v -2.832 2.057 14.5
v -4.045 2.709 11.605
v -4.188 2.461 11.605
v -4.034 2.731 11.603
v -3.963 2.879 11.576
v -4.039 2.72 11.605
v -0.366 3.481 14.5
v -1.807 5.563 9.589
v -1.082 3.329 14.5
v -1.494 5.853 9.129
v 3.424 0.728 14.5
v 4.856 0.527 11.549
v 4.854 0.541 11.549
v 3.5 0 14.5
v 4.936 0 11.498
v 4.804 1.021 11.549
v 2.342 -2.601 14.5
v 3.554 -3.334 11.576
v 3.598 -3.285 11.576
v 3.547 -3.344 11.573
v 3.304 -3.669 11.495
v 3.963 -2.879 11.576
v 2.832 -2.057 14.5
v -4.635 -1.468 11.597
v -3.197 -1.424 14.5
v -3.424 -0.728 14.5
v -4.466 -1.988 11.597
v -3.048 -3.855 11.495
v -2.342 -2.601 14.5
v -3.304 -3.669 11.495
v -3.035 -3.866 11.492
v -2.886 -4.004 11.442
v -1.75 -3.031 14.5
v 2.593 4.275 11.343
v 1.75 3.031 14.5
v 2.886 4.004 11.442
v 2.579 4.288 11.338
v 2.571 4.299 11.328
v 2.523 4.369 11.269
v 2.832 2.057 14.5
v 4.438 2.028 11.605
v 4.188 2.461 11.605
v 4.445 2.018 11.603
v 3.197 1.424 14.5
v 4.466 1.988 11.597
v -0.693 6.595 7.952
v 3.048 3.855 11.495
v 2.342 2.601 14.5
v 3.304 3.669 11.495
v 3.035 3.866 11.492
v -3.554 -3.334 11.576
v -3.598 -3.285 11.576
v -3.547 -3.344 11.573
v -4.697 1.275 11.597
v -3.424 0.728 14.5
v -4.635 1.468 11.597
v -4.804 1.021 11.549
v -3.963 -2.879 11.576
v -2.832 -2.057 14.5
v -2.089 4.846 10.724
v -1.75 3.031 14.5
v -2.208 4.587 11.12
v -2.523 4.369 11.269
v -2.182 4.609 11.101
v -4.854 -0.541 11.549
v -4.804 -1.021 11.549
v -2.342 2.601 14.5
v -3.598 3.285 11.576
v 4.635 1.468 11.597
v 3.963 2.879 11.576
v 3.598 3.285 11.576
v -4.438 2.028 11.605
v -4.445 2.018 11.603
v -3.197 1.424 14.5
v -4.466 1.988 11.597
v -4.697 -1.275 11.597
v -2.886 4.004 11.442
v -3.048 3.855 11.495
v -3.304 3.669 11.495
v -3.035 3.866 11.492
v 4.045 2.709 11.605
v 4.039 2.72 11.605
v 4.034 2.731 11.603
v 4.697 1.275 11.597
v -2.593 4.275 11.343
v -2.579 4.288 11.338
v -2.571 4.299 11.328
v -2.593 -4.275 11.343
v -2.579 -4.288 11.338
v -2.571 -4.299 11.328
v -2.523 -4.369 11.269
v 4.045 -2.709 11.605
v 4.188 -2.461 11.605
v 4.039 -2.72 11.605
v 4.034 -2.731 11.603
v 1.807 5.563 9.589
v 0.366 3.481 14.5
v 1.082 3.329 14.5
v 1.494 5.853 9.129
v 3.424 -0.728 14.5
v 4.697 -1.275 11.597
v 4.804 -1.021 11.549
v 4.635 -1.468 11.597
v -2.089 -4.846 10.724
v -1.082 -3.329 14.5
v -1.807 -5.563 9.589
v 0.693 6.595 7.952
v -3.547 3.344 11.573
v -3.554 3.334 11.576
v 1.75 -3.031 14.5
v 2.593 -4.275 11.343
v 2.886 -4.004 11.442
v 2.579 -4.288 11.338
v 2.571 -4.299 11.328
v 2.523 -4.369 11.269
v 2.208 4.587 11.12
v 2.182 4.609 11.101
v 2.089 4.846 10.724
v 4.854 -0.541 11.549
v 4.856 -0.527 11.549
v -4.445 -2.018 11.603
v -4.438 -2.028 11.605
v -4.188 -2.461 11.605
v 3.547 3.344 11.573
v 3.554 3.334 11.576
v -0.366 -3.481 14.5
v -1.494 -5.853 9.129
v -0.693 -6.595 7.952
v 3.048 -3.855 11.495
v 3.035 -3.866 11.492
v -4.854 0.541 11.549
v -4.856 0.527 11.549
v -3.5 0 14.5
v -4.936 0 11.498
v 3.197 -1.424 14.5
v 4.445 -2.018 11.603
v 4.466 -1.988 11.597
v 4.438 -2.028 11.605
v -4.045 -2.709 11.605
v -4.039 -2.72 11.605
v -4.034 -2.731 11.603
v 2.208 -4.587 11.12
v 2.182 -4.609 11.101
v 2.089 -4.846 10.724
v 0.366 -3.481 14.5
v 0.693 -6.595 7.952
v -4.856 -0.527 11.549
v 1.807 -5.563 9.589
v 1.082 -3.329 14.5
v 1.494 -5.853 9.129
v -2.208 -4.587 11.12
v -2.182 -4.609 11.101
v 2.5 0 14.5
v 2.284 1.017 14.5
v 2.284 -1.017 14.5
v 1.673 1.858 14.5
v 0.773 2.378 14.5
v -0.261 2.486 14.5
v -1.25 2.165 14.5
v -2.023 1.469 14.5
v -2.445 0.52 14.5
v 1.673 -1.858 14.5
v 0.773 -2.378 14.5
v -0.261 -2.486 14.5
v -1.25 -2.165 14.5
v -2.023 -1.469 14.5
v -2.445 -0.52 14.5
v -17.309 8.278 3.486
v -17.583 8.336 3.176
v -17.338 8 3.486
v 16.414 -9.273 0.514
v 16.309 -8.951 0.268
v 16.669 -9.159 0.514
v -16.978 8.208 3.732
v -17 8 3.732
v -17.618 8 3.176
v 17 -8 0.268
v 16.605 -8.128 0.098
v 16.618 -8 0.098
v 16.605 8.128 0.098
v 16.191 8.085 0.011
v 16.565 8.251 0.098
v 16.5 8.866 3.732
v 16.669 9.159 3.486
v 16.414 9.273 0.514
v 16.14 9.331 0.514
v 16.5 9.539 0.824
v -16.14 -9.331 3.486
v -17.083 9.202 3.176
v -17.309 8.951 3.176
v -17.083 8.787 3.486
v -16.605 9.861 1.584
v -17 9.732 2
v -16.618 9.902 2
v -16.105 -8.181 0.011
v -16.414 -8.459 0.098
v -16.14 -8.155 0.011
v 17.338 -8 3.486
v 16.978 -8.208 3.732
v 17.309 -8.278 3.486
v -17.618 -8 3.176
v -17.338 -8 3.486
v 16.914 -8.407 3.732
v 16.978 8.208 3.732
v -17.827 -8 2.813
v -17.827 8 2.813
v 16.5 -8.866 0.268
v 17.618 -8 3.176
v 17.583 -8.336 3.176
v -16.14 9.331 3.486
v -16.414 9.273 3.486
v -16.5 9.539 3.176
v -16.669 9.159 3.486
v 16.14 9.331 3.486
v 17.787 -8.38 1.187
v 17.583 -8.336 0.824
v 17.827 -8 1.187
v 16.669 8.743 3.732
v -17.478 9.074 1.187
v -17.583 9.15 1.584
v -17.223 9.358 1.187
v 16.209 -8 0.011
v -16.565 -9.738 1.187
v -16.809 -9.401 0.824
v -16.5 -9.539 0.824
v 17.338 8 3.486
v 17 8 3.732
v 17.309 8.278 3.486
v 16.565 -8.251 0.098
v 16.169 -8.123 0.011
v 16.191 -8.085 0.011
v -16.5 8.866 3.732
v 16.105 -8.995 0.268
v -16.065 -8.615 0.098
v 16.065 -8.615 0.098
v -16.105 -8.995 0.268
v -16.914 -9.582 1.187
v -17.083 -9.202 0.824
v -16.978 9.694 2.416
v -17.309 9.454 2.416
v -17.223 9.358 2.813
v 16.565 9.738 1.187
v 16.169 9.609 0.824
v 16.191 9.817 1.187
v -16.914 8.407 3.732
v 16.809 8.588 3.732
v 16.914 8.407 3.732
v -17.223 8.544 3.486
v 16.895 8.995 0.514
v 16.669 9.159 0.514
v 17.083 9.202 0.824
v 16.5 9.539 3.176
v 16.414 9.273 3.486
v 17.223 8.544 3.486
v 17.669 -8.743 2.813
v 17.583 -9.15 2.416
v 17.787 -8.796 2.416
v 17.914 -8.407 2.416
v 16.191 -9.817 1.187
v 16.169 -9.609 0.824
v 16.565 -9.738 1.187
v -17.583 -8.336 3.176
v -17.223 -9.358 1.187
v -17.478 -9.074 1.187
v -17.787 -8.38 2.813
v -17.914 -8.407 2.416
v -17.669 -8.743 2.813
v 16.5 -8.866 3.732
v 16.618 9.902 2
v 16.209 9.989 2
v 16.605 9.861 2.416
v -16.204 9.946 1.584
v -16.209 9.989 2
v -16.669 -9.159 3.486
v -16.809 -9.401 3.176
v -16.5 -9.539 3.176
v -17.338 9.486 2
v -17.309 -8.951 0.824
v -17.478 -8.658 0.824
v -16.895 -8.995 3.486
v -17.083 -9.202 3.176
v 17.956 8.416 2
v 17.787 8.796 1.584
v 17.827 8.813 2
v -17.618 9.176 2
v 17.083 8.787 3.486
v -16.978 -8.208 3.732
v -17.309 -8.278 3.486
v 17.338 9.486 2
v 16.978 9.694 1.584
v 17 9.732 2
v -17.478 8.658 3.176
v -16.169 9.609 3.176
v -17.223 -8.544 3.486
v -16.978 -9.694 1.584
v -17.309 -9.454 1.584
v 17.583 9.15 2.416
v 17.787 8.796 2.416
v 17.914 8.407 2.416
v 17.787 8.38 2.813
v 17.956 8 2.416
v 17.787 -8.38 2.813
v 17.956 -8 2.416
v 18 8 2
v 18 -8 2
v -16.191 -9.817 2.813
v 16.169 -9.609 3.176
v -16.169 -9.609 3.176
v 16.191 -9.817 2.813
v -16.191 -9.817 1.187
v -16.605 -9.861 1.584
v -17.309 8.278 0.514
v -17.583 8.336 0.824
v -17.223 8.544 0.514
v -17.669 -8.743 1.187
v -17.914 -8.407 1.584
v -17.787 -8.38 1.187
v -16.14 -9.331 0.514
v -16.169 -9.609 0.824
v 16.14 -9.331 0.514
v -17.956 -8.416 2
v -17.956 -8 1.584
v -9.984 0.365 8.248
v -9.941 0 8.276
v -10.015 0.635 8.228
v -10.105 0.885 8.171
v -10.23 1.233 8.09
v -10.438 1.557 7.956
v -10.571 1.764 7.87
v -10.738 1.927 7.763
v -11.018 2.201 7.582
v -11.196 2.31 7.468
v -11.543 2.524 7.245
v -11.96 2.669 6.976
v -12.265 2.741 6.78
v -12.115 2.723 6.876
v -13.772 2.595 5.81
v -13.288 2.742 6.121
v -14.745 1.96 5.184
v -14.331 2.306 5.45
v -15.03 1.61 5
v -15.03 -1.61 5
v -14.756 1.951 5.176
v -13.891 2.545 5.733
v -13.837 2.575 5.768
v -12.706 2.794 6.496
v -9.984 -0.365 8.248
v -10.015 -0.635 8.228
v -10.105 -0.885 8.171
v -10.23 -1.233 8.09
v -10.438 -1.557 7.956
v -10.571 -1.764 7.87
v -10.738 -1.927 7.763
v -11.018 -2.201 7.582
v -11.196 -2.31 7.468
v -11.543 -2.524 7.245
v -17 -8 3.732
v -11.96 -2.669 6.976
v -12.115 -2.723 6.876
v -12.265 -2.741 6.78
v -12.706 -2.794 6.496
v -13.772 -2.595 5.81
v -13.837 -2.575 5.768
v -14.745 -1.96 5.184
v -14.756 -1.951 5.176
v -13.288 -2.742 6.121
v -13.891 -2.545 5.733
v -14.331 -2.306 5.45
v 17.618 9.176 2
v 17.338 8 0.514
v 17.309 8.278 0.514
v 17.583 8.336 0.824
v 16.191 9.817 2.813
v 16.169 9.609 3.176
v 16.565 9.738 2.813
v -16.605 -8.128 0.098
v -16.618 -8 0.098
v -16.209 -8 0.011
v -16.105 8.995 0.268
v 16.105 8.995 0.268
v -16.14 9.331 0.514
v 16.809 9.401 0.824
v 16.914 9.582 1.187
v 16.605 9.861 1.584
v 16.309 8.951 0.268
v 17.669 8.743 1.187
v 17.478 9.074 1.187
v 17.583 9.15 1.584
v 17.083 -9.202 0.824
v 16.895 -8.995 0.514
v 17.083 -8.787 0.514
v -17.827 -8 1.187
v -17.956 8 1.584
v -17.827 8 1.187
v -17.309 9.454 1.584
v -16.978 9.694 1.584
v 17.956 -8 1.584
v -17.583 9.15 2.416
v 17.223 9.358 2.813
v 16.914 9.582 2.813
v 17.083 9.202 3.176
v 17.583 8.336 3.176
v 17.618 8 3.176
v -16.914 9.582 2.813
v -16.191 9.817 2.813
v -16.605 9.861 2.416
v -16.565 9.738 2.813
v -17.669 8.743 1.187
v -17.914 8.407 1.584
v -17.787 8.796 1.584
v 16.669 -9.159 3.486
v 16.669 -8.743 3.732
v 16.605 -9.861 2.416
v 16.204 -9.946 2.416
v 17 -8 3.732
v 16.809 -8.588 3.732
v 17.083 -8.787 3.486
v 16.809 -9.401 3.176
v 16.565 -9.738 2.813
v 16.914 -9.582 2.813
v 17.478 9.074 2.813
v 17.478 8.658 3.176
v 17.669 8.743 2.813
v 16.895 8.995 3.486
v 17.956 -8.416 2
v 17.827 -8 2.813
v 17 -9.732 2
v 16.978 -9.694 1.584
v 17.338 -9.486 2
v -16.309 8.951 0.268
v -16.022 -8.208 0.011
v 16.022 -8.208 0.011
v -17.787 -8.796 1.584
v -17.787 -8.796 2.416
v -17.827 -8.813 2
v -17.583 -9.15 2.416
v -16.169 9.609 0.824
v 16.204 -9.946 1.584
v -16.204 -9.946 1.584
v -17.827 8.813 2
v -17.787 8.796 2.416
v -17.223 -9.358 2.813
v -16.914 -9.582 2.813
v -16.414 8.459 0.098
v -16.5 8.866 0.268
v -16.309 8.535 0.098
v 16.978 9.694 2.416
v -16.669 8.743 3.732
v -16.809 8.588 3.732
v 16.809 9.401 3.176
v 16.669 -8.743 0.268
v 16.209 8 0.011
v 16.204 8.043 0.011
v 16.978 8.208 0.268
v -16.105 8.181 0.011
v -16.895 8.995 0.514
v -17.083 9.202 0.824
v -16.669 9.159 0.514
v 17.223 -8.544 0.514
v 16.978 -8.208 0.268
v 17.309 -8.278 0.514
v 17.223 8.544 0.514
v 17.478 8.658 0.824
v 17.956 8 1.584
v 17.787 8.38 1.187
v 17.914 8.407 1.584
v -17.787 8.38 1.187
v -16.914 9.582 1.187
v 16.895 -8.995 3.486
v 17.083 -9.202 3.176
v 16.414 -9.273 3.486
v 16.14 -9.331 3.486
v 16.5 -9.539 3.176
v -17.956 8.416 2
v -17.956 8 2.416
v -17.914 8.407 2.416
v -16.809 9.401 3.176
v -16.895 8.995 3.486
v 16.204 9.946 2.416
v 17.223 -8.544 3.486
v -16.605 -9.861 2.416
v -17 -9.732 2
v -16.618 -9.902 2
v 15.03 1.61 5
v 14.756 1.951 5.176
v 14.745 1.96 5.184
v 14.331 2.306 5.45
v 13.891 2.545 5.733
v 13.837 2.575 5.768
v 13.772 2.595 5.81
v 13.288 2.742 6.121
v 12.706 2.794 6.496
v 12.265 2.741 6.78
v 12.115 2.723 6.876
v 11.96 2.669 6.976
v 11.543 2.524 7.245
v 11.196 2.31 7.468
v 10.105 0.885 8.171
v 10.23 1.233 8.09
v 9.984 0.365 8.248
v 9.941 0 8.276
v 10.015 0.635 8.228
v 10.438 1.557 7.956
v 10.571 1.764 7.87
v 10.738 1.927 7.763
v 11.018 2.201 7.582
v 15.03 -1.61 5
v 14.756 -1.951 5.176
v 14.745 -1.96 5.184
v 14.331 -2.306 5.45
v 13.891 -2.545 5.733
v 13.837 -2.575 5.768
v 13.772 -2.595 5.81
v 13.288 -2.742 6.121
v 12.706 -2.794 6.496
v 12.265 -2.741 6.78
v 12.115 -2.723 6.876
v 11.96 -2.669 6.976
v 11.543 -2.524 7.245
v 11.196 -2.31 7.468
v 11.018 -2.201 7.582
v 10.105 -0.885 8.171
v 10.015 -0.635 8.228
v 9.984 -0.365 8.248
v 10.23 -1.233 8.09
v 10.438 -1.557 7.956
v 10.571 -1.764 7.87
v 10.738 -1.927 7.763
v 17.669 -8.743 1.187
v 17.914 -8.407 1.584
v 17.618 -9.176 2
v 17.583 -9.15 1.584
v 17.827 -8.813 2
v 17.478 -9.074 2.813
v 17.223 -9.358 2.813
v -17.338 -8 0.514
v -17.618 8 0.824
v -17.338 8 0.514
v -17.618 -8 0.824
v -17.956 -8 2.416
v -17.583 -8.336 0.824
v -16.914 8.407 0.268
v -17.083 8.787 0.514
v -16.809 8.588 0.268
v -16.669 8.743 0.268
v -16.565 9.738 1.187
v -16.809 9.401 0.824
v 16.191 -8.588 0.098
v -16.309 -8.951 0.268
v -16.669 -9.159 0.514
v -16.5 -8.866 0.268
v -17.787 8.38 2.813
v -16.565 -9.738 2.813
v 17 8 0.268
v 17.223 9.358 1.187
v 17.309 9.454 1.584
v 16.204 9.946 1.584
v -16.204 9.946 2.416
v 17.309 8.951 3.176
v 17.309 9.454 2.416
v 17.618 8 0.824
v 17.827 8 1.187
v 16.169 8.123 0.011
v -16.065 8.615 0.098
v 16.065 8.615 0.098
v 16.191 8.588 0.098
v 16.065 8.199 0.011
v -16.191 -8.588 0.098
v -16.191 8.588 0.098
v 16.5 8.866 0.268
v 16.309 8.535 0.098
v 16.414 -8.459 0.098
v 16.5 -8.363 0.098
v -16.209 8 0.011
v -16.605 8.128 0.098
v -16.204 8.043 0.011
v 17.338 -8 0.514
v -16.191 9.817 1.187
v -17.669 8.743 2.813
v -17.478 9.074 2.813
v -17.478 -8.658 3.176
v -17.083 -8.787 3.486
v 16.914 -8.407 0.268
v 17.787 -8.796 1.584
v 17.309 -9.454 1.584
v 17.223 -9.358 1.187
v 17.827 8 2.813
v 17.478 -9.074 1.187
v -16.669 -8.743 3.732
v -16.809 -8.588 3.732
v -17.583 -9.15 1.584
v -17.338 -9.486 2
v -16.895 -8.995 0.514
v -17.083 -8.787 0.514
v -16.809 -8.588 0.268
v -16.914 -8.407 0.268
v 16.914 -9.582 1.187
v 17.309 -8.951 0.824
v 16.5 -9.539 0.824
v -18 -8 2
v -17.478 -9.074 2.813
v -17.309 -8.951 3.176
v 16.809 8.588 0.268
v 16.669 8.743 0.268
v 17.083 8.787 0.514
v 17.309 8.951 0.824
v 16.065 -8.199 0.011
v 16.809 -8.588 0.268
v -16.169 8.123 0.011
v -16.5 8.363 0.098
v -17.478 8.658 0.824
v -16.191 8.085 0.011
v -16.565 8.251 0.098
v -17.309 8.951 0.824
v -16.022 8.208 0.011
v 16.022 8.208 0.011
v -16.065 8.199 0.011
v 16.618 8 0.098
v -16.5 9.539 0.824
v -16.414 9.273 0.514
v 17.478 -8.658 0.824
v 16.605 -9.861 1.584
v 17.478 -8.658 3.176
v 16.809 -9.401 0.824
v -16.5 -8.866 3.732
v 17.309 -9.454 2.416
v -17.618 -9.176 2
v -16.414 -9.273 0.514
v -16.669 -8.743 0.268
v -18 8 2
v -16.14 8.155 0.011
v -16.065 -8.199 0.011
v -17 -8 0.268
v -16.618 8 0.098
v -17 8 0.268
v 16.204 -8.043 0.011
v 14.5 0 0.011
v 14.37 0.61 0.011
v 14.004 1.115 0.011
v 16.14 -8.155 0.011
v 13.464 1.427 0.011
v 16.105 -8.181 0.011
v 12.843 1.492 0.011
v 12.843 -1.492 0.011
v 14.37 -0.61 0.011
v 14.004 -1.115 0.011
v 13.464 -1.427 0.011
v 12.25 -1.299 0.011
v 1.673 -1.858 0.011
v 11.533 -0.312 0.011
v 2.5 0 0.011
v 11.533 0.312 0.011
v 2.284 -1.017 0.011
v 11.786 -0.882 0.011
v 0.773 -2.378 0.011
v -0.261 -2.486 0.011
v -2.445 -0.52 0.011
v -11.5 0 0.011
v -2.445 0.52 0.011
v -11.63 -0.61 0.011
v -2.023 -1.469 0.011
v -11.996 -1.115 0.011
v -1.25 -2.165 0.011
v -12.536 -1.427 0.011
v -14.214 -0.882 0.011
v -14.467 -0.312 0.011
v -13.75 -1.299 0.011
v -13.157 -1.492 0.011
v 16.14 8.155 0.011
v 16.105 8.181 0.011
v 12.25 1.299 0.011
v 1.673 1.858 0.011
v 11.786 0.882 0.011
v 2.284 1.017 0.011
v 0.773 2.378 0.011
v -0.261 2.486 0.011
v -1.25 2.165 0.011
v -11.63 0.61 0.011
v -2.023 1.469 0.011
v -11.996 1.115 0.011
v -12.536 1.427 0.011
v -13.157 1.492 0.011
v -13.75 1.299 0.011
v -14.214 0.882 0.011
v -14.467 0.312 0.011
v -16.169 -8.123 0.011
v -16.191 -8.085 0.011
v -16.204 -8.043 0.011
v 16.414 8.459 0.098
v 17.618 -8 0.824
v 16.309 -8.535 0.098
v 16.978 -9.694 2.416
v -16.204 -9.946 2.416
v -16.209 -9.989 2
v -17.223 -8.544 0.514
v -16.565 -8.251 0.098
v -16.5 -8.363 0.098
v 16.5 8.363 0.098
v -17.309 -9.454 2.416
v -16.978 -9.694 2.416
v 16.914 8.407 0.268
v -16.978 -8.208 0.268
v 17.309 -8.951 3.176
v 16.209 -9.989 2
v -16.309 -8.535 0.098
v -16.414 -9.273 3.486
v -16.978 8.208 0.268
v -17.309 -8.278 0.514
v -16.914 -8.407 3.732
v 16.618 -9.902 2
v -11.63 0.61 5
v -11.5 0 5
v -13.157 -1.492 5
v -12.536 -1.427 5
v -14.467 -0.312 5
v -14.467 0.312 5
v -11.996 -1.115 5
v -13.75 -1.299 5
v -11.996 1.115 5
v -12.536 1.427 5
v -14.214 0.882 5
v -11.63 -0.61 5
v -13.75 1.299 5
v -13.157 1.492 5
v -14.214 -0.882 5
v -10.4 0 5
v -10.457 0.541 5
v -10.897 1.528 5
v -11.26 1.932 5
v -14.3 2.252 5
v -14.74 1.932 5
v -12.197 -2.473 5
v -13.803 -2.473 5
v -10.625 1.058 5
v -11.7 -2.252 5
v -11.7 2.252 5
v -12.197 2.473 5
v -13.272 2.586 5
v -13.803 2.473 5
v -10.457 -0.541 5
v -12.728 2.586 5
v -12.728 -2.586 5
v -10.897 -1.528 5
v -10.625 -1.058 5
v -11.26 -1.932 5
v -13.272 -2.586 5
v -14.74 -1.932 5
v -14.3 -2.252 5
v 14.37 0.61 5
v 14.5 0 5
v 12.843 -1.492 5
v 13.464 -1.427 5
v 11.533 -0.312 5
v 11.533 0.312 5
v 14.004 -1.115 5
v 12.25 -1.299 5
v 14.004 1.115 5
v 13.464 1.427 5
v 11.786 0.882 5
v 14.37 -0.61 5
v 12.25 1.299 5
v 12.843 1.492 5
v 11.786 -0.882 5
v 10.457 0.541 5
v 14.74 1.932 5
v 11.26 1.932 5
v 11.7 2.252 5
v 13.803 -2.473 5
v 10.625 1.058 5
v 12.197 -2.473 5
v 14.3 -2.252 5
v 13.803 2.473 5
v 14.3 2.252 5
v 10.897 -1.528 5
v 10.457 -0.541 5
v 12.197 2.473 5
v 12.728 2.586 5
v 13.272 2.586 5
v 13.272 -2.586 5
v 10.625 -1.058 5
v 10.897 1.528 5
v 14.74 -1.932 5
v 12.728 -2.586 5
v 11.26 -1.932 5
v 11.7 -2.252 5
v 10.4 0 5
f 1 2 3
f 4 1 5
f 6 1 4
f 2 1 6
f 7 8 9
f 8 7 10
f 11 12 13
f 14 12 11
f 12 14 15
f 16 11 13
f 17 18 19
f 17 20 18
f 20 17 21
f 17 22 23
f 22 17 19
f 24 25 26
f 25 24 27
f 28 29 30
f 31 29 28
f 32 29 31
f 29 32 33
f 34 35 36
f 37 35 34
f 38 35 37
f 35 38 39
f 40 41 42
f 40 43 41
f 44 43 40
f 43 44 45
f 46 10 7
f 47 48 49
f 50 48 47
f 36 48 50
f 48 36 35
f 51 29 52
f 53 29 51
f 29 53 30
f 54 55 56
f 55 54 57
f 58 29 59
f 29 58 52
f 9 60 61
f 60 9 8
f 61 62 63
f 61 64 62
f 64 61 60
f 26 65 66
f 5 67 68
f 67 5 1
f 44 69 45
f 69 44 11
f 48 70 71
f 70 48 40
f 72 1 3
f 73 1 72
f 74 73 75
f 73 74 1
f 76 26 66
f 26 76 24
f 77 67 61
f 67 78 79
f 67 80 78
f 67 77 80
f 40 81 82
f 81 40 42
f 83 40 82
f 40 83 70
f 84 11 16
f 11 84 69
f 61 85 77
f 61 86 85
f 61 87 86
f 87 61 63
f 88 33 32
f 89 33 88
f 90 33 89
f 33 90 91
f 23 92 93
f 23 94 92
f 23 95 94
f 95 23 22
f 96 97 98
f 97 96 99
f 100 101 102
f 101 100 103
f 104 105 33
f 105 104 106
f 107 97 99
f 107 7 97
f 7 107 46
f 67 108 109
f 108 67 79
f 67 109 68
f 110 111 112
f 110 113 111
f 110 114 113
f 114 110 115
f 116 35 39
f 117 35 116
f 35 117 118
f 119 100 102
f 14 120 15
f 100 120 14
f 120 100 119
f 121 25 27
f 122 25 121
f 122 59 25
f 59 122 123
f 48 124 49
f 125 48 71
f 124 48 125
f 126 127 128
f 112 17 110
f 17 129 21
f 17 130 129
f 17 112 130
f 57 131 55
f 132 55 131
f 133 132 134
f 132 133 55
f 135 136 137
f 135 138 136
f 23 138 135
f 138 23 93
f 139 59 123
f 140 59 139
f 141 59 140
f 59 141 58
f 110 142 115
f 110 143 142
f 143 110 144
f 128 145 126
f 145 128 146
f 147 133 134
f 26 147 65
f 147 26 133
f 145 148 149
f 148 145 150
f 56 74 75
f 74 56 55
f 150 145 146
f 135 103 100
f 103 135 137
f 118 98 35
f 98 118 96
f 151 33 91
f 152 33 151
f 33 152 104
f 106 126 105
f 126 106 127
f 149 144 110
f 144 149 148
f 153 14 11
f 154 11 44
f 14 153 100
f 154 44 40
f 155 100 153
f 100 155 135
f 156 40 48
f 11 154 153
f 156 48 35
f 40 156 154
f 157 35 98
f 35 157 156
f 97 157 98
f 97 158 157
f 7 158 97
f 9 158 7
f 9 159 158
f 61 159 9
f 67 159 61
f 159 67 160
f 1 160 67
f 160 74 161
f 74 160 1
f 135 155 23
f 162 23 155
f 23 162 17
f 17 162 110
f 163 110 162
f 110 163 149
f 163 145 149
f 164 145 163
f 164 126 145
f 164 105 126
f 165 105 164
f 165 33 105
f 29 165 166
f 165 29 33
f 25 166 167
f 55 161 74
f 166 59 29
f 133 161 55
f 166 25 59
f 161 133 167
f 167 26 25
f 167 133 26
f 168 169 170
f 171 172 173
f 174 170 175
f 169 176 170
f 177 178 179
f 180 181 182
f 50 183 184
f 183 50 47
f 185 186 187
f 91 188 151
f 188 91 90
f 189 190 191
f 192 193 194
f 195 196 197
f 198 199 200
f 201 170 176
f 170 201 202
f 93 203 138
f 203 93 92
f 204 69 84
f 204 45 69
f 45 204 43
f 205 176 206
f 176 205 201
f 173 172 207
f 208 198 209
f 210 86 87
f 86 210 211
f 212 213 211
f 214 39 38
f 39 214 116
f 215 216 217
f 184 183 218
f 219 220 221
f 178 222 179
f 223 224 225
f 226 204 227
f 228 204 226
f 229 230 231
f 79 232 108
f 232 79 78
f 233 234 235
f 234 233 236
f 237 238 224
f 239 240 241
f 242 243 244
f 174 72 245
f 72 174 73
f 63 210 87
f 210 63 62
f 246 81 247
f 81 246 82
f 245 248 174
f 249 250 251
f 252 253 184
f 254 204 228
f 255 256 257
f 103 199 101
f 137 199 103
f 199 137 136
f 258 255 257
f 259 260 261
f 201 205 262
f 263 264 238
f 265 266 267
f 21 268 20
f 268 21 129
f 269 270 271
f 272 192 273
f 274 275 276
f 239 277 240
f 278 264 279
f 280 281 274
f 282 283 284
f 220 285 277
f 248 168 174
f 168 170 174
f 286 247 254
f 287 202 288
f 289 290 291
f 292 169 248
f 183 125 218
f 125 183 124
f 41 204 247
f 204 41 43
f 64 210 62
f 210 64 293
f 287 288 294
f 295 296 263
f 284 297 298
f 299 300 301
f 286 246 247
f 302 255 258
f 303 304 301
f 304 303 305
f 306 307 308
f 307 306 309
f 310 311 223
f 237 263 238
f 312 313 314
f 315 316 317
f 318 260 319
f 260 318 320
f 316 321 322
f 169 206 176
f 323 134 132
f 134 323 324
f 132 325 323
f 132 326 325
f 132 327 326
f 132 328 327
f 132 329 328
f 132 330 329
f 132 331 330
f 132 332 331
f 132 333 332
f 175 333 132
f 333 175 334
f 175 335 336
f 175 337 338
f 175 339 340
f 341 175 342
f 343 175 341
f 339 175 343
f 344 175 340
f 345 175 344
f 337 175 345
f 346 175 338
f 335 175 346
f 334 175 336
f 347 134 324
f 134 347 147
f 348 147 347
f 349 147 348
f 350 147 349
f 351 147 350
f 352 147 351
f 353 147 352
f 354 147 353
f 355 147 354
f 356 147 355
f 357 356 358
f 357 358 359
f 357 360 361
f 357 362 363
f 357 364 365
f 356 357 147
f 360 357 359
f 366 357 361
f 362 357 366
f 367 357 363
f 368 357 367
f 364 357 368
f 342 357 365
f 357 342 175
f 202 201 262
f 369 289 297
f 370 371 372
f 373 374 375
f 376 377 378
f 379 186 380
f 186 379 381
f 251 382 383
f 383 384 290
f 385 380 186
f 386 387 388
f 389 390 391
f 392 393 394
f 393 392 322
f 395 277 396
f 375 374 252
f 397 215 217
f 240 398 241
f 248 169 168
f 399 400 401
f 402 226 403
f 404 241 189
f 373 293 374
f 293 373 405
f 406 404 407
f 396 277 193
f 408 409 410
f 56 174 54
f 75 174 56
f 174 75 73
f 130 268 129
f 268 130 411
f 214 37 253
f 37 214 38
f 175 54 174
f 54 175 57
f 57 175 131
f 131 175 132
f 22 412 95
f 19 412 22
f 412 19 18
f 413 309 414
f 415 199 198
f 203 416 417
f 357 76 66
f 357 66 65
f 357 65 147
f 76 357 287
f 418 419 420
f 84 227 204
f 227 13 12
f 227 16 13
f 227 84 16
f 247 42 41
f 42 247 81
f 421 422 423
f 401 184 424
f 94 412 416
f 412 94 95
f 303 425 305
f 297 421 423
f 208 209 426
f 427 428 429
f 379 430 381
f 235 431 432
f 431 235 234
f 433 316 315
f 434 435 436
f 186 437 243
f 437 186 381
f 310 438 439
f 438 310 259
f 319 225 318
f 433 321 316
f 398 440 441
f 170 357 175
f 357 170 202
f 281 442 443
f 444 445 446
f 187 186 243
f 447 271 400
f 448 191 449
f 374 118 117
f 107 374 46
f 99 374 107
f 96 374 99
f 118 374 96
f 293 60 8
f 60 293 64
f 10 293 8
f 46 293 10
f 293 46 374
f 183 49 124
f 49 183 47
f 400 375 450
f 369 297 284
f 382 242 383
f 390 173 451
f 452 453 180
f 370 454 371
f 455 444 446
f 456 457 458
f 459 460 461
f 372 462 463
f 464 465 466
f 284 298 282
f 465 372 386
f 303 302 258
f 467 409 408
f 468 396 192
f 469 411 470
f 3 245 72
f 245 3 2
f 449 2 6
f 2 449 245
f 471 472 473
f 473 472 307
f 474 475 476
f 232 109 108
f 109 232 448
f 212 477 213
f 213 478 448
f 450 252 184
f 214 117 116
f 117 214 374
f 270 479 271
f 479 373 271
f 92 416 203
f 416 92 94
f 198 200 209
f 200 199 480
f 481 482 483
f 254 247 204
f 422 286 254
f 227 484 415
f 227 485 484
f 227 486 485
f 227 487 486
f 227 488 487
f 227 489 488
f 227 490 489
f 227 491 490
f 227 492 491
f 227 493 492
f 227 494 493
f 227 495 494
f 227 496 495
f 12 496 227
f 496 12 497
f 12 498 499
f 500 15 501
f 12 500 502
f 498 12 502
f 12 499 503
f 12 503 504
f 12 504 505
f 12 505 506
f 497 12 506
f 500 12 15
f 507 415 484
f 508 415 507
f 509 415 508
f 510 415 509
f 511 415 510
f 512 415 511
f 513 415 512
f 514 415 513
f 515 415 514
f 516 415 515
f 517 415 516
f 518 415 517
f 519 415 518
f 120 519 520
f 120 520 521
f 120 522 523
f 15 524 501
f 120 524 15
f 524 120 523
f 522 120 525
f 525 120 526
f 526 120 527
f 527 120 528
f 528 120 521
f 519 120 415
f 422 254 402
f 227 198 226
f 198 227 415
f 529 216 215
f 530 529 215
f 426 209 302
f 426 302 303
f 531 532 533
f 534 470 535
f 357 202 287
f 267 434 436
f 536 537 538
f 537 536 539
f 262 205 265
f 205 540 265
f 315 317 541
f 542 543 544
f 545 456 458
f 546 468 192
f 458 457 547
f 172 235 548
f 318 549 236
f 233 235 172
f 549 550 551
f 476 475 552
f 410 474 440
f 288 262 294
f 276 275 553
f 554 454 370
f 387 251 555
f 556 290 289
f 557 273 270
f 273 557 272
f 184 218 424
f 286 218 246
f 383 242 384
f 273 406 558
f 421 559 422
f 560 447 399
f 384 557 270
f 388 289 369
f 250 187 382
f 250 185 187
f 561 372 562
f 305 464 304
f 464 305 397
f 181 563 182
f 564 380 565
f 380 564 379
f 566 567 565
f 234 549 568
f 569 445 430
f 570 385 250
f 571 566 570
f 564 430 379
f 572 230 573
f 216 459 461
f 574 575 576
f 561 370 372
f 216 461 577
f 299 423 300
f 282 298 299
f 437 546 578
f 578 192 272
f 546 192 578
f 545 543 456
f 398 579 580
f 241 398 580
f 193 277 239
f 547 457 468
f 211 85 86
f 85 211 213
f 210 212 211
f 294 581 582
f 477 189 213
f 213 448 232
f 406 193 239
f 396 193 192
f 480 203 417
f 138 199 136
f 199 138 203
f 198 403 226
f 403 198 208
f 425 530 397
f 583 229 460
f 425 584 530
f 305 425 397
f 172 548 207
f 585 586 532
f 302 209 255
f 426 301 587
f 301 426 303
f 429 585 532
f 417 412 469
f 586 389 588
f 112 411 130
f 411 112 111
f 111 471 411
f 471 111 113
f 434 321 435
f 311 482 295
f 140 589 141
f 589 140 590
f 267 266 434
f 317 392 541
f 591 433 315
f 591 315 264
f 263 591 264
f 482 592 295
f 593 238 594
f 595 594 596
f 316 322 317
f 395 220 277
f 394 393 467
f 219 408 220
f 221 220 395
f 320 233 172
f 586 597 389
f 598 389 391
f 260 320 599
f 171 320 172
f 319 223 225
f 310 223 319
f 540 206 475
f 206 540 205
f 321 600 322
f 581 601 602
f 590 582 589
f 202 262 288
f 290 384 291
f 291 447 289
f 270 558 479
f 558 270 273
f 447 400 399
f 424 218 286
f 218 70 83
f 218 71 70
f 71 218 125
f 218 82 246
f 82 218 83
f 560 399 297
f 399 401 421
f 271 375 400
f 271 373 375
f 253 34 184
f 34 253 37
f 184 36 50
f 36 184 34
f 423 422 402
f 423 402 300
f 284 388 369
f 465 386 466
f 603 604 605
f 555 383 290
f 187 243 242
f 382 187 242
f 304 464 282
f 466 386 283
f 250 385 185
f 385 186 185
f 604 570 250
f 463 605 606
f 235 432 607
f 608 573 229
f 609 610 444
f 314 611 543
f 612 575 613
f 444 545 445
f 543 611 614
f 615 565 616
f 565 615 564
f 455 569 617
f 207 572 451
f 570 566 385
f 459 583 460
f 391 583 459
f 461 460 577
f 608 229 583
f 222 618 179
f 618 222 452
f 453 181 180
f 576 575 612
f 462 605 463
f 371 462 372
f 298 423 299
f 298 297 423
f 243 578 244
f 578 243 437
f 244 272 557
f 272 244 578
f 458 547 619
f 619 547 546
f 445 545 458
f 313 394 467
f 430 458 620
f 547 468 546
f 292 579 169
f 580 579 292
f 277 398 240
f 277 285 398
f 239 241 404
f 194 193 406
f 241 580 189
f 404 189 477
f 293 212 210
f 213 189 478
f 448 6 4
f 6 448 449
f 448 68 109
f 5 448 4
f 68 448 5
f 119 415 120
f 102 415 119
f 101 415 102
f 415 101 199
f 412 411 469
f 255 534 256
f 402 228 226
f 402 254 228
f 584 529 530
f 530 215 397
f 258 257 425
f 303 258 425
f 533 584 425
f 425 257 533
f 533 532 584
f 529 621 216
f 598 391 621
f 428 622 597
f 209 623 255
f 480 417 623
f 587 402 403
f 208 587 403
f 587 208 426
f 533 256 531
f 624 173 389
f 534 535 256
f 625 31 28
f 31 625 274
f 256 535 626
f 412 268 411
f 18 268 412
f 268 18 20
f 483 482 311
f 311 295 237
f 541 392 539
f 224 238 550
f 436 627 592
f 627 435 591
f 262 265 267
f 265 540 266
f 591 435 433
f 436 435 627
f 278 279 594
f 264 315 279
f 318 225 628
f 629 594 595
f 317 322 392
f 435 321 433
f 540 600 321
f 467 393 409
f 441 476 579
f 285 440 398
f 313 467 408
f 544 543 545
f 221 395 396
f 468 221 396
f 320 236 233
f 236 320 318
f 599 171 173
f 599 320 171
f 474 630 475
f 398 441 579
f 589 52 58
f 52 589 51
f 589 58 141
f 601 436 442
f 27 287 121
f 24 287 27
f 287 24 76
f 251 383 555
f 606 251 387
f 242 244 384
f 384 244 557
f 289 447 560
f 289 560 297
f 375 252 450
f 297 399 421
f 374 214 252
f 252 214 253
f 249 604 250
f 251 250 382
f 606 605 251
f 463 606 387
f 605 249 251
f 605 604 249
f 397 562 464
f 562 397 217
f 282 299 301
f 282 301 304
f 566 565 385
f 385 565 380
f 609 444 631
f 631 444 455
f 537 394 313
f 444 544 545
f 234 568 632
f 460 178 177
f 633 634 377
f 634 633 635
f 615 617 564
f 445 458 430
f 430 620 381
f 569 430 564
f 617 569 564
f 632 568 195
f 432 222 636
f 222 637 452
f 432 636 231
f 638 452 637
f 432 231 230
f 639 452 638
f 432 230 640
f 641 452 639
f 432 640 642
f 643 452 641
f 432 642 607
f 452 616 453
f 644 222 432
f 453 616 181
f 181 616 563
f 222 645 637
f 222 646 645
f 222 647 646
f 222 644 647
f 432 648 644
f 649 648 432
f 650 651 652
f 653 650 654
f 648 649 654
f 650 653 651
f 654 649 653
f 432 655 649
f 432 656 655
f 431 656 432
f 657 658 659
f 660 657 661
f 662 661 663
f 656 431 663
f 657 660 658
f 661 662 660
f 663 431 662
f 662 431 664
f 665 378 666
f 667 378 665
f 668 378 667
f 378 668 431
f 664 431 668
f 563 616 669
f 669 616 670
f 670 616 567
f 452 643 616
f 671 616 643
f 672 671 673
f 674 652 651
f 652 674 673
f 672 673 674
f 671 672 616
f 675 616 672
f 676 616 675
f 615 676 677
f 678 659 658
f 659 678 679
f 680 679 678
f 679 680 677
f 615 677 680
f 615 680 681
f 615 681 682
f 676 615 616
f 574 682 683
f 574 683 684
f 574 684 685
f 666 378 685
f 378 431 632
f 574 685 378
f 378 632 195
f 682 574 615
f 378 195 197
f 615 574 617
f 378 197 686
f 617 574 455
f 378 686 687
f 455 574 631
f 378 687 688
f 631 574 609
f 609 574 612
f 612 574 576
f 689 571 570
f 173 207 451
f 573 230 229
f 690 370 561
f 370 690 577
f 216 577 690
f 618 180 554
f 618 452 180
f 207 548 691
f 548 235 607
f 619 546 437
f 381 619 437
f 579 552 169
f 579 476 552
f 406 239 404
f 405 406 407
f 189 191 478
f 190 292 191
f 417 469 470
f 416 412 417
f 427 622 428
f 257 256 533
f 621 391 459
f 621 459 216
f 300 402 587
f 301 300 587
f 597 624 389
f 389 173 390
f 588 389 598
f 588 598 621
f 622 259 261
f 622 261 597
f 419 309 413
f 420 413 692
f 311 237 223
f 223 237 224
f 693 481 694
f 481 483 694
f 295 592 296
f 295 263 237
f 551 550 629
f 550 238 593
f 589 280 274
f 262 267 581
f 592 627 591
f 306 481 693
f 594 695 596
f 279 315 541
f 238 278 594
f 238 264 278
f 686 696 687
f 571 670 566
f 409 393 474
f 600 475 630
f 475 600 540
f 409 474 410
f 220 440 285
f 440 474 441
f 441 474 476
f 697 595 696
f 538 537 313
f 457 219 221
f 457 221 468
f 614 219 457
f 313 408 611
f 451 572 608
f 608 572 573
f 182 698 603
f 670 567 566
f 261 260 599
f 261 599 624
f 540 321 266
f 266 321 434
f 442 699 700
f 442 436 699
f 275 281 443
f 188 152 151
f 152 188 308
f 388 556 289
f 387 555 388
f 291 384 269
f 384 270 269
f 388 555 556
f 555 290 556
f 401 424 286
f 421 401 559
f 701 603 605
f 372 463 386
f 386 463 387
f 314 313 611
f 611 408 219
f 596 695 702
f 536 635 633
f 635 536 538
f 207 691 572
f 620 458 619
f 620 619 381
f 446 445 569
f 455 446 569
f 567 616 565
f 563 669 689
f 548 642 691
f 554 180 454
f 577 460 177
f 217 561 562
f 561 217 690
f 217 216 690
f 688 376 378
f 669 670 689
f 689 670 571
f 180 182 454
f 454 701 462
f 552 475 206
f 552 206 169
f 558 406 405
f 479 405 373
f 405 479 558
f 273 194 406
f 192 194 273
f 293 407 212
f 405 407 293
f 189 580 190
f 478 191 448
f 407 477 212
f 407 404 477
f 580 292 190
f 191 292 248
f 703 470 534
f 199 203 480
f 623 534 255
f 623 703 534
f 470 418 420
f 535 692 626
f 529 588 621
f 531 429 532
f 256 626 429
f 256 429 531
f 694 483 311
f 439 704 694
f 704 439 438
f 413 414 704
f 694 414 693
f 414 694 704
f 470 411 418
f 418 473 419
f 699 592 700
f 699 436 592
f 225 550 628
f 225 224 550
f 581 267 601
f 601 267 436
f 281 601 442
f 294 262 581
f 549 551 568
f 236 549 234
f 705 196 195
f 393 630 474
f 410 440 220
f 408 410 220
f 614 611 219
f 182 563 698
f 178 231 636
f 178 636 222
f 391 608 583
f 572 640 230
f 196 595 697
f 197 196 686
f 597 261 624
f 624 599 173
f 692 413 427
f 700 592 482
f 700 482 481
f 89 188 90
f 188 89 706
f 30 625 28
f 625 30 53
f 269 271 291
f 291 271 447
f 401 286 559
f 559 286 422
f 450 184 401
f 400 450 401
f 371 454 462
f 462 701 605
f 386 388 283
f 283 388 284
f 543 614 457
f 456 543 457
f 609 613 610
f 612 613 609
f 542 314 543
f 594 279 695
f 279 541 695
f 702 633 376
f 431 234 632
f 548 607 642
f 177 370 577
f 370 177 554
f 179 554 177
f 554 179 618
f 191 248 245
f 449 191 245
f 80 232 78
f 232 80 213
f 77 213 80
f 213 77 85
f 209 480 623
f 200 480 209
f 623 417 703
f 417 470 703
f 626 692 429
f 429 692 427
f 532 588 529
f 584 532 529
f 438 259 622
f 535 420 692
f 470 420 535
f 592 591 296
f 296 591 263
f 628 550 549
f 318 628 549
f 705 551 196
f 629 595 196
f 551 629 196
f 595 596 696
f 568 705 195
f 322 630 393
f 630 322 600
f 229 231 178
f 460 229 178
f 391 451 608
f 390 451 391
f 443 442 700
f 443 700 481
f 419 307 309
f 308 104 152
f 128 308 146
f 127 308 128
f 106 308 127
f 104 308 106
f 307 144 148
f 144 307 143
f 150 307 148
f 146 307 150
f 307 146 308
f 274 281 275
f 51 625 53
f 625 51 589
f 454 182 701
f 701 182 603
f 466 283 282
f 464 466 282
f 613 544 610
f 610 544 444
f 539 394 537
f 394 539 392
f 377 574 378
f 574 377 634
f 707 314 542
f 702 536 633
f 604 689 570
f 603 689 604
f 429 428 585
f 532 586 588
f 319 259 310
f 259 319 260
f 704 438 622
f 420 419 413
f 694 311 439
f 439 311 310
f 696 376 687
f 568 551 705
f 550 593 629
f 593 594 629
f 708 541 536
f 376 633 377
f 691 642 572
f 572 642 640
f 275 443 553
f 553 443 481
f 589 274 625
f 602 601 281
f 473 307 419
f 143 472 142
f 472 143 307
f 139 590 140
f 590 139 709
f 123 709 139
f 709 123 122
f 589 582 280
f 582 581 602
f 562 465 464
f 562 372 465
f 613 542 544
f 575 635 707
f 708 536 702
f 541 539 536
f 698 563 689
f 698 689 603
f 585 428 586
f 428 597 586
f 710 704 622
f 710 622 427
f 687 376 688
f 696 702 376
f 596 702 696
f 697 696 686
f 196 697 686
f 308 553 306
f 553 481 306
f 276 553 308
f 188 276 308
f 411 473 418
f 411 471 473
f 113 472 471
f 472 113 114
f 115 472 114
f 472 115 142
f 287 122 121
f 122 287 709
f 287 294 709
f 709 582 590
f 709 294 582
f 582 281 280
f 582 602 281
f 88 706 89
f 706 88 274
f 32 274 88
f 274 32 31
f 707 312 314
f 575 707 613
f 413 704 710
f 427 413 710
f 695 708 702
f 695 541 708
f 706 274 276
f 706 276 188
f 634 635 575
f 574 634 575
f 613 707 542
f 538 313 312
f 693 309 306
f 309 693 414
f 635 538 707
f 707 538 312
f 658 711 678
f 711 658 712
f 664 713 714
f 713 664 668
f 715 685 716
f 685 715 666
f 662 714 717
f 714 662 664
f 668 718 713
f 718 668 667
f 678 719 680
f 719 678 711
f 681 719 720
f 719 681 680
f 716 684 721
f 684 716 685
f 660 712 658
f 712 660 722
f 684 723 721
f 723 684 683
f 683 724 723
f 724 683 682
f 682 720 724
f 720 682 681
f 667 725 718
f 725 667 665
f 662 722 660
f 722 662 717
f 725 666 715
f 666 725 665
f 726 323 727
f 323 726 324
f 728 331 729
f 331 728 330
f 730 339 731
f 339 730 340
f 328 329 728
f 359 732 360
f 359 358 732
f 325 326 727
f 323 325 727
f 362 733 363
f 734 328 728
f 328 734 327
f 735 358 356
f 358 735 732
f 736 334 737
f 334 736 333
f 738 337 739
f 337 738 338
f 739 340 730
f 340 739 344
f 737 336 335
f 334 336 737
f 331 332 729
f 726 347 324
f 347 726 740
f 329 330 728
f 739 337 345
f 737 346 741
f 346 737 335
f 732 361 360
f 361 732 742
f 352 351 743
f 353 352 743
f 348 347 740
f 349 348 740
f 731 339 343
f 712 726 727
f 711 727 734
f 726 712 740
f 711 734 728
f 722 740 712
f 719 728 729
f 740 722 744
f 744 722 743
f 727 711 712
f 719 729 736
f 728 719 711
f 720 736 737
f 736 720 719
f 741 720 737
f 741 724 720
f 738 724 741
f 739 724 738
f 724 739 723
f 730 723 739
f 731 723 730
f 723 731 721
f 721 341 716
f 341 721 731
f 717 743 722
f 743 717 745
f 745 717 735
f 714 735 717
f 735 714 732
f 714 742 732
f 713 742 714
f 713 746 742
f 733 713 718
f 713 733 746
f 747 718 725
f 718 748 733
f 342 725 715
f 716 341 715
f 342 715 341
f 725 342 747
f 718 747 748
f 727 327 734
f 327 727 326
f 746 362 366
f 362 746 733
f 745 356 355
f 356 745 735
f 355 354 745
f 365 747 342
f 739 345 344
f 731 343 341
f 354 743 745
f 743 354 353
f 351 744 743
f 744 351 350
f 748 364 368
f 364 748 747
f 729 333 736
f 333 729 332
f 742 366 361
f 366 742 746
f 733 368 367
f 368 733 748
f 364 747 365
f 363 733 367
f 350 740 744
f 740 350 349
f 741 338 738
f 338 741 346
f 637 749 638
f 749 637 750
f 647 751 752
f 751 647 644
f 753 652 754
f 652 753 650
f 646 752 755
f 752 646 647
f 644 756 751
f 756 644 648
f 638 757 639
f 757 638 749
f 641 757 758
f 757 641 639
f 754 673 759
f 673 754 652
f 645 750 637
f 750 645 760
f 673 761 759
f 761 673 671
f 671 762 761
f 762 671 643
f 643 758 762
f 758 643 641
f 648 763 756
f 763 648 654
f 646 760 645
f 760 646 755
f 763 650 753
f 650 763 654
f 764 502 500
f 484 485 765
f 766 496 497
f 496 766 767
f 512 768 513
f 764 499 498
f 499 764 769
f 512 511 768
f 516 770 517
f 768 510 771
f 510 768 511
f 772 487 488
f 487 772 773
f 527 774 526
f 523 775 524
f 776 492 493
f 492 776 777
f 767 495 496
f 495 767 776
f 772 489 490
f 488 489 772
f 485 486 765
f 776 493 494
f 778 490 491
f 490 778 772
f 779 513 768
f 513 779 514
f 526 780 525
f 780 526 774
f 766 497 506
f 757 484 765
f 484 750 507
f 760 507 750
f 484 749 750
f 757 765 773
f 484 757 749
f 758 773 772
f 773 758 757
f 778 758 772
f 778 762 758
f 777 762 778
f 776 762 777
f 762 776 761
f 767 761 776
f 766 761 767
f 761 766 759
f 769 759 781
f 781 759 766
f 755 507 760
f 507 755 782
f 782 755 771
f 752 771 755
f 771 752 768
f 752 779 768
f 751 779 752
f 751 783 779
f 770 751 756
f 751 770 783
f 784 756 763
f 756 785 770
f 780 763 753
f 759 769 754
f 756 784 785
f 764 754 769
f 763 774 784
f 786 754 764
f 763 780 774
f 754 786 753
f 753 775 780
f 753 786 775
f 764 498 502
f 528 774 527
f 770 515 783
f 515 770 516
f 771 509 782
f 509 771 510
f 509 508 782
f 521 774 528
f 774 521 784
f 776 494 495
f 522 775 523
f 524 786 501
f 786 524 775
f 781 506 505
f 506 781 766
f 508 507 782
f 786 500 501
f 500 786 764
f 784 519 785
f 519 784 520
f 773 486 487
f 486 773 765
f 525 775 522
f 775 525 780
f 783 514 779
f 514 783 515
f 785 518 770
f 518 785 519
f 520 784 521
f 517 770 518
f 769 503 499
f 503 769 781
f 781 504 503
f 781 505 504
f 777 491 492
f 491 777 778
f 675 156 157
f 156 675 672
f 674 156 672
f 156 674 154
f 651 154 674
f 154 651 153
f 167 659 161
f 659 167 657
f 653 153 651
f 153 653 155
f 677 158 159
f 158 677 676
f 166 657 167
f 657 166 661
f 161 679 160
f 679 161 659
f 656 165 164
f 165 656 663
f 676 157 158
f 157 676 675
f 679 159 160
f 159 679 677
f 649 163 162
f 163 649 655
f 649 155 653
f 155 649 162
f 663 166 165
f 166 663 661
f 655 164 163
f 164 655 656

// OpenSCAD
// lower flange to align with motor seems to be about 19mm from extrusion
// I think this will need about a 32mm M5 bolt

RES=30;

difference() { idlerMountEnvelope();
    cylinder(r=2.5,h=44,center=true,$fn=RES/2);
    
    pairX(13) { cylinder(r=1.5,h=44,center=true,$fn=RES/2);
        translate([0,0,5]) cylinder(r1=2.6,r2=4,h=10,$fn=RES);
    }
} 
    
module idlerMountEnvelope() union() {
    // M5 regular nut, 3.5mm thick, 
    //         add another 1mm for washers???
    translate([0,0,3]) cylinder(r2=3.5,r1=9,h=16-3.5-1,$fn=RES);

    hull() {
        translate([0,0,2]) pairX(16) pairY(8) sphere(2,$fn=RES);
        translate([0,0,12]) cylinder(r=4,h=.1,$fn=RES);
    }
}

module pairX(d) for(a=[-d,d]) translate([a,0,0]) children();
module pairY(d) for(a=[-d,d]) translate([0,a,0]) children();
